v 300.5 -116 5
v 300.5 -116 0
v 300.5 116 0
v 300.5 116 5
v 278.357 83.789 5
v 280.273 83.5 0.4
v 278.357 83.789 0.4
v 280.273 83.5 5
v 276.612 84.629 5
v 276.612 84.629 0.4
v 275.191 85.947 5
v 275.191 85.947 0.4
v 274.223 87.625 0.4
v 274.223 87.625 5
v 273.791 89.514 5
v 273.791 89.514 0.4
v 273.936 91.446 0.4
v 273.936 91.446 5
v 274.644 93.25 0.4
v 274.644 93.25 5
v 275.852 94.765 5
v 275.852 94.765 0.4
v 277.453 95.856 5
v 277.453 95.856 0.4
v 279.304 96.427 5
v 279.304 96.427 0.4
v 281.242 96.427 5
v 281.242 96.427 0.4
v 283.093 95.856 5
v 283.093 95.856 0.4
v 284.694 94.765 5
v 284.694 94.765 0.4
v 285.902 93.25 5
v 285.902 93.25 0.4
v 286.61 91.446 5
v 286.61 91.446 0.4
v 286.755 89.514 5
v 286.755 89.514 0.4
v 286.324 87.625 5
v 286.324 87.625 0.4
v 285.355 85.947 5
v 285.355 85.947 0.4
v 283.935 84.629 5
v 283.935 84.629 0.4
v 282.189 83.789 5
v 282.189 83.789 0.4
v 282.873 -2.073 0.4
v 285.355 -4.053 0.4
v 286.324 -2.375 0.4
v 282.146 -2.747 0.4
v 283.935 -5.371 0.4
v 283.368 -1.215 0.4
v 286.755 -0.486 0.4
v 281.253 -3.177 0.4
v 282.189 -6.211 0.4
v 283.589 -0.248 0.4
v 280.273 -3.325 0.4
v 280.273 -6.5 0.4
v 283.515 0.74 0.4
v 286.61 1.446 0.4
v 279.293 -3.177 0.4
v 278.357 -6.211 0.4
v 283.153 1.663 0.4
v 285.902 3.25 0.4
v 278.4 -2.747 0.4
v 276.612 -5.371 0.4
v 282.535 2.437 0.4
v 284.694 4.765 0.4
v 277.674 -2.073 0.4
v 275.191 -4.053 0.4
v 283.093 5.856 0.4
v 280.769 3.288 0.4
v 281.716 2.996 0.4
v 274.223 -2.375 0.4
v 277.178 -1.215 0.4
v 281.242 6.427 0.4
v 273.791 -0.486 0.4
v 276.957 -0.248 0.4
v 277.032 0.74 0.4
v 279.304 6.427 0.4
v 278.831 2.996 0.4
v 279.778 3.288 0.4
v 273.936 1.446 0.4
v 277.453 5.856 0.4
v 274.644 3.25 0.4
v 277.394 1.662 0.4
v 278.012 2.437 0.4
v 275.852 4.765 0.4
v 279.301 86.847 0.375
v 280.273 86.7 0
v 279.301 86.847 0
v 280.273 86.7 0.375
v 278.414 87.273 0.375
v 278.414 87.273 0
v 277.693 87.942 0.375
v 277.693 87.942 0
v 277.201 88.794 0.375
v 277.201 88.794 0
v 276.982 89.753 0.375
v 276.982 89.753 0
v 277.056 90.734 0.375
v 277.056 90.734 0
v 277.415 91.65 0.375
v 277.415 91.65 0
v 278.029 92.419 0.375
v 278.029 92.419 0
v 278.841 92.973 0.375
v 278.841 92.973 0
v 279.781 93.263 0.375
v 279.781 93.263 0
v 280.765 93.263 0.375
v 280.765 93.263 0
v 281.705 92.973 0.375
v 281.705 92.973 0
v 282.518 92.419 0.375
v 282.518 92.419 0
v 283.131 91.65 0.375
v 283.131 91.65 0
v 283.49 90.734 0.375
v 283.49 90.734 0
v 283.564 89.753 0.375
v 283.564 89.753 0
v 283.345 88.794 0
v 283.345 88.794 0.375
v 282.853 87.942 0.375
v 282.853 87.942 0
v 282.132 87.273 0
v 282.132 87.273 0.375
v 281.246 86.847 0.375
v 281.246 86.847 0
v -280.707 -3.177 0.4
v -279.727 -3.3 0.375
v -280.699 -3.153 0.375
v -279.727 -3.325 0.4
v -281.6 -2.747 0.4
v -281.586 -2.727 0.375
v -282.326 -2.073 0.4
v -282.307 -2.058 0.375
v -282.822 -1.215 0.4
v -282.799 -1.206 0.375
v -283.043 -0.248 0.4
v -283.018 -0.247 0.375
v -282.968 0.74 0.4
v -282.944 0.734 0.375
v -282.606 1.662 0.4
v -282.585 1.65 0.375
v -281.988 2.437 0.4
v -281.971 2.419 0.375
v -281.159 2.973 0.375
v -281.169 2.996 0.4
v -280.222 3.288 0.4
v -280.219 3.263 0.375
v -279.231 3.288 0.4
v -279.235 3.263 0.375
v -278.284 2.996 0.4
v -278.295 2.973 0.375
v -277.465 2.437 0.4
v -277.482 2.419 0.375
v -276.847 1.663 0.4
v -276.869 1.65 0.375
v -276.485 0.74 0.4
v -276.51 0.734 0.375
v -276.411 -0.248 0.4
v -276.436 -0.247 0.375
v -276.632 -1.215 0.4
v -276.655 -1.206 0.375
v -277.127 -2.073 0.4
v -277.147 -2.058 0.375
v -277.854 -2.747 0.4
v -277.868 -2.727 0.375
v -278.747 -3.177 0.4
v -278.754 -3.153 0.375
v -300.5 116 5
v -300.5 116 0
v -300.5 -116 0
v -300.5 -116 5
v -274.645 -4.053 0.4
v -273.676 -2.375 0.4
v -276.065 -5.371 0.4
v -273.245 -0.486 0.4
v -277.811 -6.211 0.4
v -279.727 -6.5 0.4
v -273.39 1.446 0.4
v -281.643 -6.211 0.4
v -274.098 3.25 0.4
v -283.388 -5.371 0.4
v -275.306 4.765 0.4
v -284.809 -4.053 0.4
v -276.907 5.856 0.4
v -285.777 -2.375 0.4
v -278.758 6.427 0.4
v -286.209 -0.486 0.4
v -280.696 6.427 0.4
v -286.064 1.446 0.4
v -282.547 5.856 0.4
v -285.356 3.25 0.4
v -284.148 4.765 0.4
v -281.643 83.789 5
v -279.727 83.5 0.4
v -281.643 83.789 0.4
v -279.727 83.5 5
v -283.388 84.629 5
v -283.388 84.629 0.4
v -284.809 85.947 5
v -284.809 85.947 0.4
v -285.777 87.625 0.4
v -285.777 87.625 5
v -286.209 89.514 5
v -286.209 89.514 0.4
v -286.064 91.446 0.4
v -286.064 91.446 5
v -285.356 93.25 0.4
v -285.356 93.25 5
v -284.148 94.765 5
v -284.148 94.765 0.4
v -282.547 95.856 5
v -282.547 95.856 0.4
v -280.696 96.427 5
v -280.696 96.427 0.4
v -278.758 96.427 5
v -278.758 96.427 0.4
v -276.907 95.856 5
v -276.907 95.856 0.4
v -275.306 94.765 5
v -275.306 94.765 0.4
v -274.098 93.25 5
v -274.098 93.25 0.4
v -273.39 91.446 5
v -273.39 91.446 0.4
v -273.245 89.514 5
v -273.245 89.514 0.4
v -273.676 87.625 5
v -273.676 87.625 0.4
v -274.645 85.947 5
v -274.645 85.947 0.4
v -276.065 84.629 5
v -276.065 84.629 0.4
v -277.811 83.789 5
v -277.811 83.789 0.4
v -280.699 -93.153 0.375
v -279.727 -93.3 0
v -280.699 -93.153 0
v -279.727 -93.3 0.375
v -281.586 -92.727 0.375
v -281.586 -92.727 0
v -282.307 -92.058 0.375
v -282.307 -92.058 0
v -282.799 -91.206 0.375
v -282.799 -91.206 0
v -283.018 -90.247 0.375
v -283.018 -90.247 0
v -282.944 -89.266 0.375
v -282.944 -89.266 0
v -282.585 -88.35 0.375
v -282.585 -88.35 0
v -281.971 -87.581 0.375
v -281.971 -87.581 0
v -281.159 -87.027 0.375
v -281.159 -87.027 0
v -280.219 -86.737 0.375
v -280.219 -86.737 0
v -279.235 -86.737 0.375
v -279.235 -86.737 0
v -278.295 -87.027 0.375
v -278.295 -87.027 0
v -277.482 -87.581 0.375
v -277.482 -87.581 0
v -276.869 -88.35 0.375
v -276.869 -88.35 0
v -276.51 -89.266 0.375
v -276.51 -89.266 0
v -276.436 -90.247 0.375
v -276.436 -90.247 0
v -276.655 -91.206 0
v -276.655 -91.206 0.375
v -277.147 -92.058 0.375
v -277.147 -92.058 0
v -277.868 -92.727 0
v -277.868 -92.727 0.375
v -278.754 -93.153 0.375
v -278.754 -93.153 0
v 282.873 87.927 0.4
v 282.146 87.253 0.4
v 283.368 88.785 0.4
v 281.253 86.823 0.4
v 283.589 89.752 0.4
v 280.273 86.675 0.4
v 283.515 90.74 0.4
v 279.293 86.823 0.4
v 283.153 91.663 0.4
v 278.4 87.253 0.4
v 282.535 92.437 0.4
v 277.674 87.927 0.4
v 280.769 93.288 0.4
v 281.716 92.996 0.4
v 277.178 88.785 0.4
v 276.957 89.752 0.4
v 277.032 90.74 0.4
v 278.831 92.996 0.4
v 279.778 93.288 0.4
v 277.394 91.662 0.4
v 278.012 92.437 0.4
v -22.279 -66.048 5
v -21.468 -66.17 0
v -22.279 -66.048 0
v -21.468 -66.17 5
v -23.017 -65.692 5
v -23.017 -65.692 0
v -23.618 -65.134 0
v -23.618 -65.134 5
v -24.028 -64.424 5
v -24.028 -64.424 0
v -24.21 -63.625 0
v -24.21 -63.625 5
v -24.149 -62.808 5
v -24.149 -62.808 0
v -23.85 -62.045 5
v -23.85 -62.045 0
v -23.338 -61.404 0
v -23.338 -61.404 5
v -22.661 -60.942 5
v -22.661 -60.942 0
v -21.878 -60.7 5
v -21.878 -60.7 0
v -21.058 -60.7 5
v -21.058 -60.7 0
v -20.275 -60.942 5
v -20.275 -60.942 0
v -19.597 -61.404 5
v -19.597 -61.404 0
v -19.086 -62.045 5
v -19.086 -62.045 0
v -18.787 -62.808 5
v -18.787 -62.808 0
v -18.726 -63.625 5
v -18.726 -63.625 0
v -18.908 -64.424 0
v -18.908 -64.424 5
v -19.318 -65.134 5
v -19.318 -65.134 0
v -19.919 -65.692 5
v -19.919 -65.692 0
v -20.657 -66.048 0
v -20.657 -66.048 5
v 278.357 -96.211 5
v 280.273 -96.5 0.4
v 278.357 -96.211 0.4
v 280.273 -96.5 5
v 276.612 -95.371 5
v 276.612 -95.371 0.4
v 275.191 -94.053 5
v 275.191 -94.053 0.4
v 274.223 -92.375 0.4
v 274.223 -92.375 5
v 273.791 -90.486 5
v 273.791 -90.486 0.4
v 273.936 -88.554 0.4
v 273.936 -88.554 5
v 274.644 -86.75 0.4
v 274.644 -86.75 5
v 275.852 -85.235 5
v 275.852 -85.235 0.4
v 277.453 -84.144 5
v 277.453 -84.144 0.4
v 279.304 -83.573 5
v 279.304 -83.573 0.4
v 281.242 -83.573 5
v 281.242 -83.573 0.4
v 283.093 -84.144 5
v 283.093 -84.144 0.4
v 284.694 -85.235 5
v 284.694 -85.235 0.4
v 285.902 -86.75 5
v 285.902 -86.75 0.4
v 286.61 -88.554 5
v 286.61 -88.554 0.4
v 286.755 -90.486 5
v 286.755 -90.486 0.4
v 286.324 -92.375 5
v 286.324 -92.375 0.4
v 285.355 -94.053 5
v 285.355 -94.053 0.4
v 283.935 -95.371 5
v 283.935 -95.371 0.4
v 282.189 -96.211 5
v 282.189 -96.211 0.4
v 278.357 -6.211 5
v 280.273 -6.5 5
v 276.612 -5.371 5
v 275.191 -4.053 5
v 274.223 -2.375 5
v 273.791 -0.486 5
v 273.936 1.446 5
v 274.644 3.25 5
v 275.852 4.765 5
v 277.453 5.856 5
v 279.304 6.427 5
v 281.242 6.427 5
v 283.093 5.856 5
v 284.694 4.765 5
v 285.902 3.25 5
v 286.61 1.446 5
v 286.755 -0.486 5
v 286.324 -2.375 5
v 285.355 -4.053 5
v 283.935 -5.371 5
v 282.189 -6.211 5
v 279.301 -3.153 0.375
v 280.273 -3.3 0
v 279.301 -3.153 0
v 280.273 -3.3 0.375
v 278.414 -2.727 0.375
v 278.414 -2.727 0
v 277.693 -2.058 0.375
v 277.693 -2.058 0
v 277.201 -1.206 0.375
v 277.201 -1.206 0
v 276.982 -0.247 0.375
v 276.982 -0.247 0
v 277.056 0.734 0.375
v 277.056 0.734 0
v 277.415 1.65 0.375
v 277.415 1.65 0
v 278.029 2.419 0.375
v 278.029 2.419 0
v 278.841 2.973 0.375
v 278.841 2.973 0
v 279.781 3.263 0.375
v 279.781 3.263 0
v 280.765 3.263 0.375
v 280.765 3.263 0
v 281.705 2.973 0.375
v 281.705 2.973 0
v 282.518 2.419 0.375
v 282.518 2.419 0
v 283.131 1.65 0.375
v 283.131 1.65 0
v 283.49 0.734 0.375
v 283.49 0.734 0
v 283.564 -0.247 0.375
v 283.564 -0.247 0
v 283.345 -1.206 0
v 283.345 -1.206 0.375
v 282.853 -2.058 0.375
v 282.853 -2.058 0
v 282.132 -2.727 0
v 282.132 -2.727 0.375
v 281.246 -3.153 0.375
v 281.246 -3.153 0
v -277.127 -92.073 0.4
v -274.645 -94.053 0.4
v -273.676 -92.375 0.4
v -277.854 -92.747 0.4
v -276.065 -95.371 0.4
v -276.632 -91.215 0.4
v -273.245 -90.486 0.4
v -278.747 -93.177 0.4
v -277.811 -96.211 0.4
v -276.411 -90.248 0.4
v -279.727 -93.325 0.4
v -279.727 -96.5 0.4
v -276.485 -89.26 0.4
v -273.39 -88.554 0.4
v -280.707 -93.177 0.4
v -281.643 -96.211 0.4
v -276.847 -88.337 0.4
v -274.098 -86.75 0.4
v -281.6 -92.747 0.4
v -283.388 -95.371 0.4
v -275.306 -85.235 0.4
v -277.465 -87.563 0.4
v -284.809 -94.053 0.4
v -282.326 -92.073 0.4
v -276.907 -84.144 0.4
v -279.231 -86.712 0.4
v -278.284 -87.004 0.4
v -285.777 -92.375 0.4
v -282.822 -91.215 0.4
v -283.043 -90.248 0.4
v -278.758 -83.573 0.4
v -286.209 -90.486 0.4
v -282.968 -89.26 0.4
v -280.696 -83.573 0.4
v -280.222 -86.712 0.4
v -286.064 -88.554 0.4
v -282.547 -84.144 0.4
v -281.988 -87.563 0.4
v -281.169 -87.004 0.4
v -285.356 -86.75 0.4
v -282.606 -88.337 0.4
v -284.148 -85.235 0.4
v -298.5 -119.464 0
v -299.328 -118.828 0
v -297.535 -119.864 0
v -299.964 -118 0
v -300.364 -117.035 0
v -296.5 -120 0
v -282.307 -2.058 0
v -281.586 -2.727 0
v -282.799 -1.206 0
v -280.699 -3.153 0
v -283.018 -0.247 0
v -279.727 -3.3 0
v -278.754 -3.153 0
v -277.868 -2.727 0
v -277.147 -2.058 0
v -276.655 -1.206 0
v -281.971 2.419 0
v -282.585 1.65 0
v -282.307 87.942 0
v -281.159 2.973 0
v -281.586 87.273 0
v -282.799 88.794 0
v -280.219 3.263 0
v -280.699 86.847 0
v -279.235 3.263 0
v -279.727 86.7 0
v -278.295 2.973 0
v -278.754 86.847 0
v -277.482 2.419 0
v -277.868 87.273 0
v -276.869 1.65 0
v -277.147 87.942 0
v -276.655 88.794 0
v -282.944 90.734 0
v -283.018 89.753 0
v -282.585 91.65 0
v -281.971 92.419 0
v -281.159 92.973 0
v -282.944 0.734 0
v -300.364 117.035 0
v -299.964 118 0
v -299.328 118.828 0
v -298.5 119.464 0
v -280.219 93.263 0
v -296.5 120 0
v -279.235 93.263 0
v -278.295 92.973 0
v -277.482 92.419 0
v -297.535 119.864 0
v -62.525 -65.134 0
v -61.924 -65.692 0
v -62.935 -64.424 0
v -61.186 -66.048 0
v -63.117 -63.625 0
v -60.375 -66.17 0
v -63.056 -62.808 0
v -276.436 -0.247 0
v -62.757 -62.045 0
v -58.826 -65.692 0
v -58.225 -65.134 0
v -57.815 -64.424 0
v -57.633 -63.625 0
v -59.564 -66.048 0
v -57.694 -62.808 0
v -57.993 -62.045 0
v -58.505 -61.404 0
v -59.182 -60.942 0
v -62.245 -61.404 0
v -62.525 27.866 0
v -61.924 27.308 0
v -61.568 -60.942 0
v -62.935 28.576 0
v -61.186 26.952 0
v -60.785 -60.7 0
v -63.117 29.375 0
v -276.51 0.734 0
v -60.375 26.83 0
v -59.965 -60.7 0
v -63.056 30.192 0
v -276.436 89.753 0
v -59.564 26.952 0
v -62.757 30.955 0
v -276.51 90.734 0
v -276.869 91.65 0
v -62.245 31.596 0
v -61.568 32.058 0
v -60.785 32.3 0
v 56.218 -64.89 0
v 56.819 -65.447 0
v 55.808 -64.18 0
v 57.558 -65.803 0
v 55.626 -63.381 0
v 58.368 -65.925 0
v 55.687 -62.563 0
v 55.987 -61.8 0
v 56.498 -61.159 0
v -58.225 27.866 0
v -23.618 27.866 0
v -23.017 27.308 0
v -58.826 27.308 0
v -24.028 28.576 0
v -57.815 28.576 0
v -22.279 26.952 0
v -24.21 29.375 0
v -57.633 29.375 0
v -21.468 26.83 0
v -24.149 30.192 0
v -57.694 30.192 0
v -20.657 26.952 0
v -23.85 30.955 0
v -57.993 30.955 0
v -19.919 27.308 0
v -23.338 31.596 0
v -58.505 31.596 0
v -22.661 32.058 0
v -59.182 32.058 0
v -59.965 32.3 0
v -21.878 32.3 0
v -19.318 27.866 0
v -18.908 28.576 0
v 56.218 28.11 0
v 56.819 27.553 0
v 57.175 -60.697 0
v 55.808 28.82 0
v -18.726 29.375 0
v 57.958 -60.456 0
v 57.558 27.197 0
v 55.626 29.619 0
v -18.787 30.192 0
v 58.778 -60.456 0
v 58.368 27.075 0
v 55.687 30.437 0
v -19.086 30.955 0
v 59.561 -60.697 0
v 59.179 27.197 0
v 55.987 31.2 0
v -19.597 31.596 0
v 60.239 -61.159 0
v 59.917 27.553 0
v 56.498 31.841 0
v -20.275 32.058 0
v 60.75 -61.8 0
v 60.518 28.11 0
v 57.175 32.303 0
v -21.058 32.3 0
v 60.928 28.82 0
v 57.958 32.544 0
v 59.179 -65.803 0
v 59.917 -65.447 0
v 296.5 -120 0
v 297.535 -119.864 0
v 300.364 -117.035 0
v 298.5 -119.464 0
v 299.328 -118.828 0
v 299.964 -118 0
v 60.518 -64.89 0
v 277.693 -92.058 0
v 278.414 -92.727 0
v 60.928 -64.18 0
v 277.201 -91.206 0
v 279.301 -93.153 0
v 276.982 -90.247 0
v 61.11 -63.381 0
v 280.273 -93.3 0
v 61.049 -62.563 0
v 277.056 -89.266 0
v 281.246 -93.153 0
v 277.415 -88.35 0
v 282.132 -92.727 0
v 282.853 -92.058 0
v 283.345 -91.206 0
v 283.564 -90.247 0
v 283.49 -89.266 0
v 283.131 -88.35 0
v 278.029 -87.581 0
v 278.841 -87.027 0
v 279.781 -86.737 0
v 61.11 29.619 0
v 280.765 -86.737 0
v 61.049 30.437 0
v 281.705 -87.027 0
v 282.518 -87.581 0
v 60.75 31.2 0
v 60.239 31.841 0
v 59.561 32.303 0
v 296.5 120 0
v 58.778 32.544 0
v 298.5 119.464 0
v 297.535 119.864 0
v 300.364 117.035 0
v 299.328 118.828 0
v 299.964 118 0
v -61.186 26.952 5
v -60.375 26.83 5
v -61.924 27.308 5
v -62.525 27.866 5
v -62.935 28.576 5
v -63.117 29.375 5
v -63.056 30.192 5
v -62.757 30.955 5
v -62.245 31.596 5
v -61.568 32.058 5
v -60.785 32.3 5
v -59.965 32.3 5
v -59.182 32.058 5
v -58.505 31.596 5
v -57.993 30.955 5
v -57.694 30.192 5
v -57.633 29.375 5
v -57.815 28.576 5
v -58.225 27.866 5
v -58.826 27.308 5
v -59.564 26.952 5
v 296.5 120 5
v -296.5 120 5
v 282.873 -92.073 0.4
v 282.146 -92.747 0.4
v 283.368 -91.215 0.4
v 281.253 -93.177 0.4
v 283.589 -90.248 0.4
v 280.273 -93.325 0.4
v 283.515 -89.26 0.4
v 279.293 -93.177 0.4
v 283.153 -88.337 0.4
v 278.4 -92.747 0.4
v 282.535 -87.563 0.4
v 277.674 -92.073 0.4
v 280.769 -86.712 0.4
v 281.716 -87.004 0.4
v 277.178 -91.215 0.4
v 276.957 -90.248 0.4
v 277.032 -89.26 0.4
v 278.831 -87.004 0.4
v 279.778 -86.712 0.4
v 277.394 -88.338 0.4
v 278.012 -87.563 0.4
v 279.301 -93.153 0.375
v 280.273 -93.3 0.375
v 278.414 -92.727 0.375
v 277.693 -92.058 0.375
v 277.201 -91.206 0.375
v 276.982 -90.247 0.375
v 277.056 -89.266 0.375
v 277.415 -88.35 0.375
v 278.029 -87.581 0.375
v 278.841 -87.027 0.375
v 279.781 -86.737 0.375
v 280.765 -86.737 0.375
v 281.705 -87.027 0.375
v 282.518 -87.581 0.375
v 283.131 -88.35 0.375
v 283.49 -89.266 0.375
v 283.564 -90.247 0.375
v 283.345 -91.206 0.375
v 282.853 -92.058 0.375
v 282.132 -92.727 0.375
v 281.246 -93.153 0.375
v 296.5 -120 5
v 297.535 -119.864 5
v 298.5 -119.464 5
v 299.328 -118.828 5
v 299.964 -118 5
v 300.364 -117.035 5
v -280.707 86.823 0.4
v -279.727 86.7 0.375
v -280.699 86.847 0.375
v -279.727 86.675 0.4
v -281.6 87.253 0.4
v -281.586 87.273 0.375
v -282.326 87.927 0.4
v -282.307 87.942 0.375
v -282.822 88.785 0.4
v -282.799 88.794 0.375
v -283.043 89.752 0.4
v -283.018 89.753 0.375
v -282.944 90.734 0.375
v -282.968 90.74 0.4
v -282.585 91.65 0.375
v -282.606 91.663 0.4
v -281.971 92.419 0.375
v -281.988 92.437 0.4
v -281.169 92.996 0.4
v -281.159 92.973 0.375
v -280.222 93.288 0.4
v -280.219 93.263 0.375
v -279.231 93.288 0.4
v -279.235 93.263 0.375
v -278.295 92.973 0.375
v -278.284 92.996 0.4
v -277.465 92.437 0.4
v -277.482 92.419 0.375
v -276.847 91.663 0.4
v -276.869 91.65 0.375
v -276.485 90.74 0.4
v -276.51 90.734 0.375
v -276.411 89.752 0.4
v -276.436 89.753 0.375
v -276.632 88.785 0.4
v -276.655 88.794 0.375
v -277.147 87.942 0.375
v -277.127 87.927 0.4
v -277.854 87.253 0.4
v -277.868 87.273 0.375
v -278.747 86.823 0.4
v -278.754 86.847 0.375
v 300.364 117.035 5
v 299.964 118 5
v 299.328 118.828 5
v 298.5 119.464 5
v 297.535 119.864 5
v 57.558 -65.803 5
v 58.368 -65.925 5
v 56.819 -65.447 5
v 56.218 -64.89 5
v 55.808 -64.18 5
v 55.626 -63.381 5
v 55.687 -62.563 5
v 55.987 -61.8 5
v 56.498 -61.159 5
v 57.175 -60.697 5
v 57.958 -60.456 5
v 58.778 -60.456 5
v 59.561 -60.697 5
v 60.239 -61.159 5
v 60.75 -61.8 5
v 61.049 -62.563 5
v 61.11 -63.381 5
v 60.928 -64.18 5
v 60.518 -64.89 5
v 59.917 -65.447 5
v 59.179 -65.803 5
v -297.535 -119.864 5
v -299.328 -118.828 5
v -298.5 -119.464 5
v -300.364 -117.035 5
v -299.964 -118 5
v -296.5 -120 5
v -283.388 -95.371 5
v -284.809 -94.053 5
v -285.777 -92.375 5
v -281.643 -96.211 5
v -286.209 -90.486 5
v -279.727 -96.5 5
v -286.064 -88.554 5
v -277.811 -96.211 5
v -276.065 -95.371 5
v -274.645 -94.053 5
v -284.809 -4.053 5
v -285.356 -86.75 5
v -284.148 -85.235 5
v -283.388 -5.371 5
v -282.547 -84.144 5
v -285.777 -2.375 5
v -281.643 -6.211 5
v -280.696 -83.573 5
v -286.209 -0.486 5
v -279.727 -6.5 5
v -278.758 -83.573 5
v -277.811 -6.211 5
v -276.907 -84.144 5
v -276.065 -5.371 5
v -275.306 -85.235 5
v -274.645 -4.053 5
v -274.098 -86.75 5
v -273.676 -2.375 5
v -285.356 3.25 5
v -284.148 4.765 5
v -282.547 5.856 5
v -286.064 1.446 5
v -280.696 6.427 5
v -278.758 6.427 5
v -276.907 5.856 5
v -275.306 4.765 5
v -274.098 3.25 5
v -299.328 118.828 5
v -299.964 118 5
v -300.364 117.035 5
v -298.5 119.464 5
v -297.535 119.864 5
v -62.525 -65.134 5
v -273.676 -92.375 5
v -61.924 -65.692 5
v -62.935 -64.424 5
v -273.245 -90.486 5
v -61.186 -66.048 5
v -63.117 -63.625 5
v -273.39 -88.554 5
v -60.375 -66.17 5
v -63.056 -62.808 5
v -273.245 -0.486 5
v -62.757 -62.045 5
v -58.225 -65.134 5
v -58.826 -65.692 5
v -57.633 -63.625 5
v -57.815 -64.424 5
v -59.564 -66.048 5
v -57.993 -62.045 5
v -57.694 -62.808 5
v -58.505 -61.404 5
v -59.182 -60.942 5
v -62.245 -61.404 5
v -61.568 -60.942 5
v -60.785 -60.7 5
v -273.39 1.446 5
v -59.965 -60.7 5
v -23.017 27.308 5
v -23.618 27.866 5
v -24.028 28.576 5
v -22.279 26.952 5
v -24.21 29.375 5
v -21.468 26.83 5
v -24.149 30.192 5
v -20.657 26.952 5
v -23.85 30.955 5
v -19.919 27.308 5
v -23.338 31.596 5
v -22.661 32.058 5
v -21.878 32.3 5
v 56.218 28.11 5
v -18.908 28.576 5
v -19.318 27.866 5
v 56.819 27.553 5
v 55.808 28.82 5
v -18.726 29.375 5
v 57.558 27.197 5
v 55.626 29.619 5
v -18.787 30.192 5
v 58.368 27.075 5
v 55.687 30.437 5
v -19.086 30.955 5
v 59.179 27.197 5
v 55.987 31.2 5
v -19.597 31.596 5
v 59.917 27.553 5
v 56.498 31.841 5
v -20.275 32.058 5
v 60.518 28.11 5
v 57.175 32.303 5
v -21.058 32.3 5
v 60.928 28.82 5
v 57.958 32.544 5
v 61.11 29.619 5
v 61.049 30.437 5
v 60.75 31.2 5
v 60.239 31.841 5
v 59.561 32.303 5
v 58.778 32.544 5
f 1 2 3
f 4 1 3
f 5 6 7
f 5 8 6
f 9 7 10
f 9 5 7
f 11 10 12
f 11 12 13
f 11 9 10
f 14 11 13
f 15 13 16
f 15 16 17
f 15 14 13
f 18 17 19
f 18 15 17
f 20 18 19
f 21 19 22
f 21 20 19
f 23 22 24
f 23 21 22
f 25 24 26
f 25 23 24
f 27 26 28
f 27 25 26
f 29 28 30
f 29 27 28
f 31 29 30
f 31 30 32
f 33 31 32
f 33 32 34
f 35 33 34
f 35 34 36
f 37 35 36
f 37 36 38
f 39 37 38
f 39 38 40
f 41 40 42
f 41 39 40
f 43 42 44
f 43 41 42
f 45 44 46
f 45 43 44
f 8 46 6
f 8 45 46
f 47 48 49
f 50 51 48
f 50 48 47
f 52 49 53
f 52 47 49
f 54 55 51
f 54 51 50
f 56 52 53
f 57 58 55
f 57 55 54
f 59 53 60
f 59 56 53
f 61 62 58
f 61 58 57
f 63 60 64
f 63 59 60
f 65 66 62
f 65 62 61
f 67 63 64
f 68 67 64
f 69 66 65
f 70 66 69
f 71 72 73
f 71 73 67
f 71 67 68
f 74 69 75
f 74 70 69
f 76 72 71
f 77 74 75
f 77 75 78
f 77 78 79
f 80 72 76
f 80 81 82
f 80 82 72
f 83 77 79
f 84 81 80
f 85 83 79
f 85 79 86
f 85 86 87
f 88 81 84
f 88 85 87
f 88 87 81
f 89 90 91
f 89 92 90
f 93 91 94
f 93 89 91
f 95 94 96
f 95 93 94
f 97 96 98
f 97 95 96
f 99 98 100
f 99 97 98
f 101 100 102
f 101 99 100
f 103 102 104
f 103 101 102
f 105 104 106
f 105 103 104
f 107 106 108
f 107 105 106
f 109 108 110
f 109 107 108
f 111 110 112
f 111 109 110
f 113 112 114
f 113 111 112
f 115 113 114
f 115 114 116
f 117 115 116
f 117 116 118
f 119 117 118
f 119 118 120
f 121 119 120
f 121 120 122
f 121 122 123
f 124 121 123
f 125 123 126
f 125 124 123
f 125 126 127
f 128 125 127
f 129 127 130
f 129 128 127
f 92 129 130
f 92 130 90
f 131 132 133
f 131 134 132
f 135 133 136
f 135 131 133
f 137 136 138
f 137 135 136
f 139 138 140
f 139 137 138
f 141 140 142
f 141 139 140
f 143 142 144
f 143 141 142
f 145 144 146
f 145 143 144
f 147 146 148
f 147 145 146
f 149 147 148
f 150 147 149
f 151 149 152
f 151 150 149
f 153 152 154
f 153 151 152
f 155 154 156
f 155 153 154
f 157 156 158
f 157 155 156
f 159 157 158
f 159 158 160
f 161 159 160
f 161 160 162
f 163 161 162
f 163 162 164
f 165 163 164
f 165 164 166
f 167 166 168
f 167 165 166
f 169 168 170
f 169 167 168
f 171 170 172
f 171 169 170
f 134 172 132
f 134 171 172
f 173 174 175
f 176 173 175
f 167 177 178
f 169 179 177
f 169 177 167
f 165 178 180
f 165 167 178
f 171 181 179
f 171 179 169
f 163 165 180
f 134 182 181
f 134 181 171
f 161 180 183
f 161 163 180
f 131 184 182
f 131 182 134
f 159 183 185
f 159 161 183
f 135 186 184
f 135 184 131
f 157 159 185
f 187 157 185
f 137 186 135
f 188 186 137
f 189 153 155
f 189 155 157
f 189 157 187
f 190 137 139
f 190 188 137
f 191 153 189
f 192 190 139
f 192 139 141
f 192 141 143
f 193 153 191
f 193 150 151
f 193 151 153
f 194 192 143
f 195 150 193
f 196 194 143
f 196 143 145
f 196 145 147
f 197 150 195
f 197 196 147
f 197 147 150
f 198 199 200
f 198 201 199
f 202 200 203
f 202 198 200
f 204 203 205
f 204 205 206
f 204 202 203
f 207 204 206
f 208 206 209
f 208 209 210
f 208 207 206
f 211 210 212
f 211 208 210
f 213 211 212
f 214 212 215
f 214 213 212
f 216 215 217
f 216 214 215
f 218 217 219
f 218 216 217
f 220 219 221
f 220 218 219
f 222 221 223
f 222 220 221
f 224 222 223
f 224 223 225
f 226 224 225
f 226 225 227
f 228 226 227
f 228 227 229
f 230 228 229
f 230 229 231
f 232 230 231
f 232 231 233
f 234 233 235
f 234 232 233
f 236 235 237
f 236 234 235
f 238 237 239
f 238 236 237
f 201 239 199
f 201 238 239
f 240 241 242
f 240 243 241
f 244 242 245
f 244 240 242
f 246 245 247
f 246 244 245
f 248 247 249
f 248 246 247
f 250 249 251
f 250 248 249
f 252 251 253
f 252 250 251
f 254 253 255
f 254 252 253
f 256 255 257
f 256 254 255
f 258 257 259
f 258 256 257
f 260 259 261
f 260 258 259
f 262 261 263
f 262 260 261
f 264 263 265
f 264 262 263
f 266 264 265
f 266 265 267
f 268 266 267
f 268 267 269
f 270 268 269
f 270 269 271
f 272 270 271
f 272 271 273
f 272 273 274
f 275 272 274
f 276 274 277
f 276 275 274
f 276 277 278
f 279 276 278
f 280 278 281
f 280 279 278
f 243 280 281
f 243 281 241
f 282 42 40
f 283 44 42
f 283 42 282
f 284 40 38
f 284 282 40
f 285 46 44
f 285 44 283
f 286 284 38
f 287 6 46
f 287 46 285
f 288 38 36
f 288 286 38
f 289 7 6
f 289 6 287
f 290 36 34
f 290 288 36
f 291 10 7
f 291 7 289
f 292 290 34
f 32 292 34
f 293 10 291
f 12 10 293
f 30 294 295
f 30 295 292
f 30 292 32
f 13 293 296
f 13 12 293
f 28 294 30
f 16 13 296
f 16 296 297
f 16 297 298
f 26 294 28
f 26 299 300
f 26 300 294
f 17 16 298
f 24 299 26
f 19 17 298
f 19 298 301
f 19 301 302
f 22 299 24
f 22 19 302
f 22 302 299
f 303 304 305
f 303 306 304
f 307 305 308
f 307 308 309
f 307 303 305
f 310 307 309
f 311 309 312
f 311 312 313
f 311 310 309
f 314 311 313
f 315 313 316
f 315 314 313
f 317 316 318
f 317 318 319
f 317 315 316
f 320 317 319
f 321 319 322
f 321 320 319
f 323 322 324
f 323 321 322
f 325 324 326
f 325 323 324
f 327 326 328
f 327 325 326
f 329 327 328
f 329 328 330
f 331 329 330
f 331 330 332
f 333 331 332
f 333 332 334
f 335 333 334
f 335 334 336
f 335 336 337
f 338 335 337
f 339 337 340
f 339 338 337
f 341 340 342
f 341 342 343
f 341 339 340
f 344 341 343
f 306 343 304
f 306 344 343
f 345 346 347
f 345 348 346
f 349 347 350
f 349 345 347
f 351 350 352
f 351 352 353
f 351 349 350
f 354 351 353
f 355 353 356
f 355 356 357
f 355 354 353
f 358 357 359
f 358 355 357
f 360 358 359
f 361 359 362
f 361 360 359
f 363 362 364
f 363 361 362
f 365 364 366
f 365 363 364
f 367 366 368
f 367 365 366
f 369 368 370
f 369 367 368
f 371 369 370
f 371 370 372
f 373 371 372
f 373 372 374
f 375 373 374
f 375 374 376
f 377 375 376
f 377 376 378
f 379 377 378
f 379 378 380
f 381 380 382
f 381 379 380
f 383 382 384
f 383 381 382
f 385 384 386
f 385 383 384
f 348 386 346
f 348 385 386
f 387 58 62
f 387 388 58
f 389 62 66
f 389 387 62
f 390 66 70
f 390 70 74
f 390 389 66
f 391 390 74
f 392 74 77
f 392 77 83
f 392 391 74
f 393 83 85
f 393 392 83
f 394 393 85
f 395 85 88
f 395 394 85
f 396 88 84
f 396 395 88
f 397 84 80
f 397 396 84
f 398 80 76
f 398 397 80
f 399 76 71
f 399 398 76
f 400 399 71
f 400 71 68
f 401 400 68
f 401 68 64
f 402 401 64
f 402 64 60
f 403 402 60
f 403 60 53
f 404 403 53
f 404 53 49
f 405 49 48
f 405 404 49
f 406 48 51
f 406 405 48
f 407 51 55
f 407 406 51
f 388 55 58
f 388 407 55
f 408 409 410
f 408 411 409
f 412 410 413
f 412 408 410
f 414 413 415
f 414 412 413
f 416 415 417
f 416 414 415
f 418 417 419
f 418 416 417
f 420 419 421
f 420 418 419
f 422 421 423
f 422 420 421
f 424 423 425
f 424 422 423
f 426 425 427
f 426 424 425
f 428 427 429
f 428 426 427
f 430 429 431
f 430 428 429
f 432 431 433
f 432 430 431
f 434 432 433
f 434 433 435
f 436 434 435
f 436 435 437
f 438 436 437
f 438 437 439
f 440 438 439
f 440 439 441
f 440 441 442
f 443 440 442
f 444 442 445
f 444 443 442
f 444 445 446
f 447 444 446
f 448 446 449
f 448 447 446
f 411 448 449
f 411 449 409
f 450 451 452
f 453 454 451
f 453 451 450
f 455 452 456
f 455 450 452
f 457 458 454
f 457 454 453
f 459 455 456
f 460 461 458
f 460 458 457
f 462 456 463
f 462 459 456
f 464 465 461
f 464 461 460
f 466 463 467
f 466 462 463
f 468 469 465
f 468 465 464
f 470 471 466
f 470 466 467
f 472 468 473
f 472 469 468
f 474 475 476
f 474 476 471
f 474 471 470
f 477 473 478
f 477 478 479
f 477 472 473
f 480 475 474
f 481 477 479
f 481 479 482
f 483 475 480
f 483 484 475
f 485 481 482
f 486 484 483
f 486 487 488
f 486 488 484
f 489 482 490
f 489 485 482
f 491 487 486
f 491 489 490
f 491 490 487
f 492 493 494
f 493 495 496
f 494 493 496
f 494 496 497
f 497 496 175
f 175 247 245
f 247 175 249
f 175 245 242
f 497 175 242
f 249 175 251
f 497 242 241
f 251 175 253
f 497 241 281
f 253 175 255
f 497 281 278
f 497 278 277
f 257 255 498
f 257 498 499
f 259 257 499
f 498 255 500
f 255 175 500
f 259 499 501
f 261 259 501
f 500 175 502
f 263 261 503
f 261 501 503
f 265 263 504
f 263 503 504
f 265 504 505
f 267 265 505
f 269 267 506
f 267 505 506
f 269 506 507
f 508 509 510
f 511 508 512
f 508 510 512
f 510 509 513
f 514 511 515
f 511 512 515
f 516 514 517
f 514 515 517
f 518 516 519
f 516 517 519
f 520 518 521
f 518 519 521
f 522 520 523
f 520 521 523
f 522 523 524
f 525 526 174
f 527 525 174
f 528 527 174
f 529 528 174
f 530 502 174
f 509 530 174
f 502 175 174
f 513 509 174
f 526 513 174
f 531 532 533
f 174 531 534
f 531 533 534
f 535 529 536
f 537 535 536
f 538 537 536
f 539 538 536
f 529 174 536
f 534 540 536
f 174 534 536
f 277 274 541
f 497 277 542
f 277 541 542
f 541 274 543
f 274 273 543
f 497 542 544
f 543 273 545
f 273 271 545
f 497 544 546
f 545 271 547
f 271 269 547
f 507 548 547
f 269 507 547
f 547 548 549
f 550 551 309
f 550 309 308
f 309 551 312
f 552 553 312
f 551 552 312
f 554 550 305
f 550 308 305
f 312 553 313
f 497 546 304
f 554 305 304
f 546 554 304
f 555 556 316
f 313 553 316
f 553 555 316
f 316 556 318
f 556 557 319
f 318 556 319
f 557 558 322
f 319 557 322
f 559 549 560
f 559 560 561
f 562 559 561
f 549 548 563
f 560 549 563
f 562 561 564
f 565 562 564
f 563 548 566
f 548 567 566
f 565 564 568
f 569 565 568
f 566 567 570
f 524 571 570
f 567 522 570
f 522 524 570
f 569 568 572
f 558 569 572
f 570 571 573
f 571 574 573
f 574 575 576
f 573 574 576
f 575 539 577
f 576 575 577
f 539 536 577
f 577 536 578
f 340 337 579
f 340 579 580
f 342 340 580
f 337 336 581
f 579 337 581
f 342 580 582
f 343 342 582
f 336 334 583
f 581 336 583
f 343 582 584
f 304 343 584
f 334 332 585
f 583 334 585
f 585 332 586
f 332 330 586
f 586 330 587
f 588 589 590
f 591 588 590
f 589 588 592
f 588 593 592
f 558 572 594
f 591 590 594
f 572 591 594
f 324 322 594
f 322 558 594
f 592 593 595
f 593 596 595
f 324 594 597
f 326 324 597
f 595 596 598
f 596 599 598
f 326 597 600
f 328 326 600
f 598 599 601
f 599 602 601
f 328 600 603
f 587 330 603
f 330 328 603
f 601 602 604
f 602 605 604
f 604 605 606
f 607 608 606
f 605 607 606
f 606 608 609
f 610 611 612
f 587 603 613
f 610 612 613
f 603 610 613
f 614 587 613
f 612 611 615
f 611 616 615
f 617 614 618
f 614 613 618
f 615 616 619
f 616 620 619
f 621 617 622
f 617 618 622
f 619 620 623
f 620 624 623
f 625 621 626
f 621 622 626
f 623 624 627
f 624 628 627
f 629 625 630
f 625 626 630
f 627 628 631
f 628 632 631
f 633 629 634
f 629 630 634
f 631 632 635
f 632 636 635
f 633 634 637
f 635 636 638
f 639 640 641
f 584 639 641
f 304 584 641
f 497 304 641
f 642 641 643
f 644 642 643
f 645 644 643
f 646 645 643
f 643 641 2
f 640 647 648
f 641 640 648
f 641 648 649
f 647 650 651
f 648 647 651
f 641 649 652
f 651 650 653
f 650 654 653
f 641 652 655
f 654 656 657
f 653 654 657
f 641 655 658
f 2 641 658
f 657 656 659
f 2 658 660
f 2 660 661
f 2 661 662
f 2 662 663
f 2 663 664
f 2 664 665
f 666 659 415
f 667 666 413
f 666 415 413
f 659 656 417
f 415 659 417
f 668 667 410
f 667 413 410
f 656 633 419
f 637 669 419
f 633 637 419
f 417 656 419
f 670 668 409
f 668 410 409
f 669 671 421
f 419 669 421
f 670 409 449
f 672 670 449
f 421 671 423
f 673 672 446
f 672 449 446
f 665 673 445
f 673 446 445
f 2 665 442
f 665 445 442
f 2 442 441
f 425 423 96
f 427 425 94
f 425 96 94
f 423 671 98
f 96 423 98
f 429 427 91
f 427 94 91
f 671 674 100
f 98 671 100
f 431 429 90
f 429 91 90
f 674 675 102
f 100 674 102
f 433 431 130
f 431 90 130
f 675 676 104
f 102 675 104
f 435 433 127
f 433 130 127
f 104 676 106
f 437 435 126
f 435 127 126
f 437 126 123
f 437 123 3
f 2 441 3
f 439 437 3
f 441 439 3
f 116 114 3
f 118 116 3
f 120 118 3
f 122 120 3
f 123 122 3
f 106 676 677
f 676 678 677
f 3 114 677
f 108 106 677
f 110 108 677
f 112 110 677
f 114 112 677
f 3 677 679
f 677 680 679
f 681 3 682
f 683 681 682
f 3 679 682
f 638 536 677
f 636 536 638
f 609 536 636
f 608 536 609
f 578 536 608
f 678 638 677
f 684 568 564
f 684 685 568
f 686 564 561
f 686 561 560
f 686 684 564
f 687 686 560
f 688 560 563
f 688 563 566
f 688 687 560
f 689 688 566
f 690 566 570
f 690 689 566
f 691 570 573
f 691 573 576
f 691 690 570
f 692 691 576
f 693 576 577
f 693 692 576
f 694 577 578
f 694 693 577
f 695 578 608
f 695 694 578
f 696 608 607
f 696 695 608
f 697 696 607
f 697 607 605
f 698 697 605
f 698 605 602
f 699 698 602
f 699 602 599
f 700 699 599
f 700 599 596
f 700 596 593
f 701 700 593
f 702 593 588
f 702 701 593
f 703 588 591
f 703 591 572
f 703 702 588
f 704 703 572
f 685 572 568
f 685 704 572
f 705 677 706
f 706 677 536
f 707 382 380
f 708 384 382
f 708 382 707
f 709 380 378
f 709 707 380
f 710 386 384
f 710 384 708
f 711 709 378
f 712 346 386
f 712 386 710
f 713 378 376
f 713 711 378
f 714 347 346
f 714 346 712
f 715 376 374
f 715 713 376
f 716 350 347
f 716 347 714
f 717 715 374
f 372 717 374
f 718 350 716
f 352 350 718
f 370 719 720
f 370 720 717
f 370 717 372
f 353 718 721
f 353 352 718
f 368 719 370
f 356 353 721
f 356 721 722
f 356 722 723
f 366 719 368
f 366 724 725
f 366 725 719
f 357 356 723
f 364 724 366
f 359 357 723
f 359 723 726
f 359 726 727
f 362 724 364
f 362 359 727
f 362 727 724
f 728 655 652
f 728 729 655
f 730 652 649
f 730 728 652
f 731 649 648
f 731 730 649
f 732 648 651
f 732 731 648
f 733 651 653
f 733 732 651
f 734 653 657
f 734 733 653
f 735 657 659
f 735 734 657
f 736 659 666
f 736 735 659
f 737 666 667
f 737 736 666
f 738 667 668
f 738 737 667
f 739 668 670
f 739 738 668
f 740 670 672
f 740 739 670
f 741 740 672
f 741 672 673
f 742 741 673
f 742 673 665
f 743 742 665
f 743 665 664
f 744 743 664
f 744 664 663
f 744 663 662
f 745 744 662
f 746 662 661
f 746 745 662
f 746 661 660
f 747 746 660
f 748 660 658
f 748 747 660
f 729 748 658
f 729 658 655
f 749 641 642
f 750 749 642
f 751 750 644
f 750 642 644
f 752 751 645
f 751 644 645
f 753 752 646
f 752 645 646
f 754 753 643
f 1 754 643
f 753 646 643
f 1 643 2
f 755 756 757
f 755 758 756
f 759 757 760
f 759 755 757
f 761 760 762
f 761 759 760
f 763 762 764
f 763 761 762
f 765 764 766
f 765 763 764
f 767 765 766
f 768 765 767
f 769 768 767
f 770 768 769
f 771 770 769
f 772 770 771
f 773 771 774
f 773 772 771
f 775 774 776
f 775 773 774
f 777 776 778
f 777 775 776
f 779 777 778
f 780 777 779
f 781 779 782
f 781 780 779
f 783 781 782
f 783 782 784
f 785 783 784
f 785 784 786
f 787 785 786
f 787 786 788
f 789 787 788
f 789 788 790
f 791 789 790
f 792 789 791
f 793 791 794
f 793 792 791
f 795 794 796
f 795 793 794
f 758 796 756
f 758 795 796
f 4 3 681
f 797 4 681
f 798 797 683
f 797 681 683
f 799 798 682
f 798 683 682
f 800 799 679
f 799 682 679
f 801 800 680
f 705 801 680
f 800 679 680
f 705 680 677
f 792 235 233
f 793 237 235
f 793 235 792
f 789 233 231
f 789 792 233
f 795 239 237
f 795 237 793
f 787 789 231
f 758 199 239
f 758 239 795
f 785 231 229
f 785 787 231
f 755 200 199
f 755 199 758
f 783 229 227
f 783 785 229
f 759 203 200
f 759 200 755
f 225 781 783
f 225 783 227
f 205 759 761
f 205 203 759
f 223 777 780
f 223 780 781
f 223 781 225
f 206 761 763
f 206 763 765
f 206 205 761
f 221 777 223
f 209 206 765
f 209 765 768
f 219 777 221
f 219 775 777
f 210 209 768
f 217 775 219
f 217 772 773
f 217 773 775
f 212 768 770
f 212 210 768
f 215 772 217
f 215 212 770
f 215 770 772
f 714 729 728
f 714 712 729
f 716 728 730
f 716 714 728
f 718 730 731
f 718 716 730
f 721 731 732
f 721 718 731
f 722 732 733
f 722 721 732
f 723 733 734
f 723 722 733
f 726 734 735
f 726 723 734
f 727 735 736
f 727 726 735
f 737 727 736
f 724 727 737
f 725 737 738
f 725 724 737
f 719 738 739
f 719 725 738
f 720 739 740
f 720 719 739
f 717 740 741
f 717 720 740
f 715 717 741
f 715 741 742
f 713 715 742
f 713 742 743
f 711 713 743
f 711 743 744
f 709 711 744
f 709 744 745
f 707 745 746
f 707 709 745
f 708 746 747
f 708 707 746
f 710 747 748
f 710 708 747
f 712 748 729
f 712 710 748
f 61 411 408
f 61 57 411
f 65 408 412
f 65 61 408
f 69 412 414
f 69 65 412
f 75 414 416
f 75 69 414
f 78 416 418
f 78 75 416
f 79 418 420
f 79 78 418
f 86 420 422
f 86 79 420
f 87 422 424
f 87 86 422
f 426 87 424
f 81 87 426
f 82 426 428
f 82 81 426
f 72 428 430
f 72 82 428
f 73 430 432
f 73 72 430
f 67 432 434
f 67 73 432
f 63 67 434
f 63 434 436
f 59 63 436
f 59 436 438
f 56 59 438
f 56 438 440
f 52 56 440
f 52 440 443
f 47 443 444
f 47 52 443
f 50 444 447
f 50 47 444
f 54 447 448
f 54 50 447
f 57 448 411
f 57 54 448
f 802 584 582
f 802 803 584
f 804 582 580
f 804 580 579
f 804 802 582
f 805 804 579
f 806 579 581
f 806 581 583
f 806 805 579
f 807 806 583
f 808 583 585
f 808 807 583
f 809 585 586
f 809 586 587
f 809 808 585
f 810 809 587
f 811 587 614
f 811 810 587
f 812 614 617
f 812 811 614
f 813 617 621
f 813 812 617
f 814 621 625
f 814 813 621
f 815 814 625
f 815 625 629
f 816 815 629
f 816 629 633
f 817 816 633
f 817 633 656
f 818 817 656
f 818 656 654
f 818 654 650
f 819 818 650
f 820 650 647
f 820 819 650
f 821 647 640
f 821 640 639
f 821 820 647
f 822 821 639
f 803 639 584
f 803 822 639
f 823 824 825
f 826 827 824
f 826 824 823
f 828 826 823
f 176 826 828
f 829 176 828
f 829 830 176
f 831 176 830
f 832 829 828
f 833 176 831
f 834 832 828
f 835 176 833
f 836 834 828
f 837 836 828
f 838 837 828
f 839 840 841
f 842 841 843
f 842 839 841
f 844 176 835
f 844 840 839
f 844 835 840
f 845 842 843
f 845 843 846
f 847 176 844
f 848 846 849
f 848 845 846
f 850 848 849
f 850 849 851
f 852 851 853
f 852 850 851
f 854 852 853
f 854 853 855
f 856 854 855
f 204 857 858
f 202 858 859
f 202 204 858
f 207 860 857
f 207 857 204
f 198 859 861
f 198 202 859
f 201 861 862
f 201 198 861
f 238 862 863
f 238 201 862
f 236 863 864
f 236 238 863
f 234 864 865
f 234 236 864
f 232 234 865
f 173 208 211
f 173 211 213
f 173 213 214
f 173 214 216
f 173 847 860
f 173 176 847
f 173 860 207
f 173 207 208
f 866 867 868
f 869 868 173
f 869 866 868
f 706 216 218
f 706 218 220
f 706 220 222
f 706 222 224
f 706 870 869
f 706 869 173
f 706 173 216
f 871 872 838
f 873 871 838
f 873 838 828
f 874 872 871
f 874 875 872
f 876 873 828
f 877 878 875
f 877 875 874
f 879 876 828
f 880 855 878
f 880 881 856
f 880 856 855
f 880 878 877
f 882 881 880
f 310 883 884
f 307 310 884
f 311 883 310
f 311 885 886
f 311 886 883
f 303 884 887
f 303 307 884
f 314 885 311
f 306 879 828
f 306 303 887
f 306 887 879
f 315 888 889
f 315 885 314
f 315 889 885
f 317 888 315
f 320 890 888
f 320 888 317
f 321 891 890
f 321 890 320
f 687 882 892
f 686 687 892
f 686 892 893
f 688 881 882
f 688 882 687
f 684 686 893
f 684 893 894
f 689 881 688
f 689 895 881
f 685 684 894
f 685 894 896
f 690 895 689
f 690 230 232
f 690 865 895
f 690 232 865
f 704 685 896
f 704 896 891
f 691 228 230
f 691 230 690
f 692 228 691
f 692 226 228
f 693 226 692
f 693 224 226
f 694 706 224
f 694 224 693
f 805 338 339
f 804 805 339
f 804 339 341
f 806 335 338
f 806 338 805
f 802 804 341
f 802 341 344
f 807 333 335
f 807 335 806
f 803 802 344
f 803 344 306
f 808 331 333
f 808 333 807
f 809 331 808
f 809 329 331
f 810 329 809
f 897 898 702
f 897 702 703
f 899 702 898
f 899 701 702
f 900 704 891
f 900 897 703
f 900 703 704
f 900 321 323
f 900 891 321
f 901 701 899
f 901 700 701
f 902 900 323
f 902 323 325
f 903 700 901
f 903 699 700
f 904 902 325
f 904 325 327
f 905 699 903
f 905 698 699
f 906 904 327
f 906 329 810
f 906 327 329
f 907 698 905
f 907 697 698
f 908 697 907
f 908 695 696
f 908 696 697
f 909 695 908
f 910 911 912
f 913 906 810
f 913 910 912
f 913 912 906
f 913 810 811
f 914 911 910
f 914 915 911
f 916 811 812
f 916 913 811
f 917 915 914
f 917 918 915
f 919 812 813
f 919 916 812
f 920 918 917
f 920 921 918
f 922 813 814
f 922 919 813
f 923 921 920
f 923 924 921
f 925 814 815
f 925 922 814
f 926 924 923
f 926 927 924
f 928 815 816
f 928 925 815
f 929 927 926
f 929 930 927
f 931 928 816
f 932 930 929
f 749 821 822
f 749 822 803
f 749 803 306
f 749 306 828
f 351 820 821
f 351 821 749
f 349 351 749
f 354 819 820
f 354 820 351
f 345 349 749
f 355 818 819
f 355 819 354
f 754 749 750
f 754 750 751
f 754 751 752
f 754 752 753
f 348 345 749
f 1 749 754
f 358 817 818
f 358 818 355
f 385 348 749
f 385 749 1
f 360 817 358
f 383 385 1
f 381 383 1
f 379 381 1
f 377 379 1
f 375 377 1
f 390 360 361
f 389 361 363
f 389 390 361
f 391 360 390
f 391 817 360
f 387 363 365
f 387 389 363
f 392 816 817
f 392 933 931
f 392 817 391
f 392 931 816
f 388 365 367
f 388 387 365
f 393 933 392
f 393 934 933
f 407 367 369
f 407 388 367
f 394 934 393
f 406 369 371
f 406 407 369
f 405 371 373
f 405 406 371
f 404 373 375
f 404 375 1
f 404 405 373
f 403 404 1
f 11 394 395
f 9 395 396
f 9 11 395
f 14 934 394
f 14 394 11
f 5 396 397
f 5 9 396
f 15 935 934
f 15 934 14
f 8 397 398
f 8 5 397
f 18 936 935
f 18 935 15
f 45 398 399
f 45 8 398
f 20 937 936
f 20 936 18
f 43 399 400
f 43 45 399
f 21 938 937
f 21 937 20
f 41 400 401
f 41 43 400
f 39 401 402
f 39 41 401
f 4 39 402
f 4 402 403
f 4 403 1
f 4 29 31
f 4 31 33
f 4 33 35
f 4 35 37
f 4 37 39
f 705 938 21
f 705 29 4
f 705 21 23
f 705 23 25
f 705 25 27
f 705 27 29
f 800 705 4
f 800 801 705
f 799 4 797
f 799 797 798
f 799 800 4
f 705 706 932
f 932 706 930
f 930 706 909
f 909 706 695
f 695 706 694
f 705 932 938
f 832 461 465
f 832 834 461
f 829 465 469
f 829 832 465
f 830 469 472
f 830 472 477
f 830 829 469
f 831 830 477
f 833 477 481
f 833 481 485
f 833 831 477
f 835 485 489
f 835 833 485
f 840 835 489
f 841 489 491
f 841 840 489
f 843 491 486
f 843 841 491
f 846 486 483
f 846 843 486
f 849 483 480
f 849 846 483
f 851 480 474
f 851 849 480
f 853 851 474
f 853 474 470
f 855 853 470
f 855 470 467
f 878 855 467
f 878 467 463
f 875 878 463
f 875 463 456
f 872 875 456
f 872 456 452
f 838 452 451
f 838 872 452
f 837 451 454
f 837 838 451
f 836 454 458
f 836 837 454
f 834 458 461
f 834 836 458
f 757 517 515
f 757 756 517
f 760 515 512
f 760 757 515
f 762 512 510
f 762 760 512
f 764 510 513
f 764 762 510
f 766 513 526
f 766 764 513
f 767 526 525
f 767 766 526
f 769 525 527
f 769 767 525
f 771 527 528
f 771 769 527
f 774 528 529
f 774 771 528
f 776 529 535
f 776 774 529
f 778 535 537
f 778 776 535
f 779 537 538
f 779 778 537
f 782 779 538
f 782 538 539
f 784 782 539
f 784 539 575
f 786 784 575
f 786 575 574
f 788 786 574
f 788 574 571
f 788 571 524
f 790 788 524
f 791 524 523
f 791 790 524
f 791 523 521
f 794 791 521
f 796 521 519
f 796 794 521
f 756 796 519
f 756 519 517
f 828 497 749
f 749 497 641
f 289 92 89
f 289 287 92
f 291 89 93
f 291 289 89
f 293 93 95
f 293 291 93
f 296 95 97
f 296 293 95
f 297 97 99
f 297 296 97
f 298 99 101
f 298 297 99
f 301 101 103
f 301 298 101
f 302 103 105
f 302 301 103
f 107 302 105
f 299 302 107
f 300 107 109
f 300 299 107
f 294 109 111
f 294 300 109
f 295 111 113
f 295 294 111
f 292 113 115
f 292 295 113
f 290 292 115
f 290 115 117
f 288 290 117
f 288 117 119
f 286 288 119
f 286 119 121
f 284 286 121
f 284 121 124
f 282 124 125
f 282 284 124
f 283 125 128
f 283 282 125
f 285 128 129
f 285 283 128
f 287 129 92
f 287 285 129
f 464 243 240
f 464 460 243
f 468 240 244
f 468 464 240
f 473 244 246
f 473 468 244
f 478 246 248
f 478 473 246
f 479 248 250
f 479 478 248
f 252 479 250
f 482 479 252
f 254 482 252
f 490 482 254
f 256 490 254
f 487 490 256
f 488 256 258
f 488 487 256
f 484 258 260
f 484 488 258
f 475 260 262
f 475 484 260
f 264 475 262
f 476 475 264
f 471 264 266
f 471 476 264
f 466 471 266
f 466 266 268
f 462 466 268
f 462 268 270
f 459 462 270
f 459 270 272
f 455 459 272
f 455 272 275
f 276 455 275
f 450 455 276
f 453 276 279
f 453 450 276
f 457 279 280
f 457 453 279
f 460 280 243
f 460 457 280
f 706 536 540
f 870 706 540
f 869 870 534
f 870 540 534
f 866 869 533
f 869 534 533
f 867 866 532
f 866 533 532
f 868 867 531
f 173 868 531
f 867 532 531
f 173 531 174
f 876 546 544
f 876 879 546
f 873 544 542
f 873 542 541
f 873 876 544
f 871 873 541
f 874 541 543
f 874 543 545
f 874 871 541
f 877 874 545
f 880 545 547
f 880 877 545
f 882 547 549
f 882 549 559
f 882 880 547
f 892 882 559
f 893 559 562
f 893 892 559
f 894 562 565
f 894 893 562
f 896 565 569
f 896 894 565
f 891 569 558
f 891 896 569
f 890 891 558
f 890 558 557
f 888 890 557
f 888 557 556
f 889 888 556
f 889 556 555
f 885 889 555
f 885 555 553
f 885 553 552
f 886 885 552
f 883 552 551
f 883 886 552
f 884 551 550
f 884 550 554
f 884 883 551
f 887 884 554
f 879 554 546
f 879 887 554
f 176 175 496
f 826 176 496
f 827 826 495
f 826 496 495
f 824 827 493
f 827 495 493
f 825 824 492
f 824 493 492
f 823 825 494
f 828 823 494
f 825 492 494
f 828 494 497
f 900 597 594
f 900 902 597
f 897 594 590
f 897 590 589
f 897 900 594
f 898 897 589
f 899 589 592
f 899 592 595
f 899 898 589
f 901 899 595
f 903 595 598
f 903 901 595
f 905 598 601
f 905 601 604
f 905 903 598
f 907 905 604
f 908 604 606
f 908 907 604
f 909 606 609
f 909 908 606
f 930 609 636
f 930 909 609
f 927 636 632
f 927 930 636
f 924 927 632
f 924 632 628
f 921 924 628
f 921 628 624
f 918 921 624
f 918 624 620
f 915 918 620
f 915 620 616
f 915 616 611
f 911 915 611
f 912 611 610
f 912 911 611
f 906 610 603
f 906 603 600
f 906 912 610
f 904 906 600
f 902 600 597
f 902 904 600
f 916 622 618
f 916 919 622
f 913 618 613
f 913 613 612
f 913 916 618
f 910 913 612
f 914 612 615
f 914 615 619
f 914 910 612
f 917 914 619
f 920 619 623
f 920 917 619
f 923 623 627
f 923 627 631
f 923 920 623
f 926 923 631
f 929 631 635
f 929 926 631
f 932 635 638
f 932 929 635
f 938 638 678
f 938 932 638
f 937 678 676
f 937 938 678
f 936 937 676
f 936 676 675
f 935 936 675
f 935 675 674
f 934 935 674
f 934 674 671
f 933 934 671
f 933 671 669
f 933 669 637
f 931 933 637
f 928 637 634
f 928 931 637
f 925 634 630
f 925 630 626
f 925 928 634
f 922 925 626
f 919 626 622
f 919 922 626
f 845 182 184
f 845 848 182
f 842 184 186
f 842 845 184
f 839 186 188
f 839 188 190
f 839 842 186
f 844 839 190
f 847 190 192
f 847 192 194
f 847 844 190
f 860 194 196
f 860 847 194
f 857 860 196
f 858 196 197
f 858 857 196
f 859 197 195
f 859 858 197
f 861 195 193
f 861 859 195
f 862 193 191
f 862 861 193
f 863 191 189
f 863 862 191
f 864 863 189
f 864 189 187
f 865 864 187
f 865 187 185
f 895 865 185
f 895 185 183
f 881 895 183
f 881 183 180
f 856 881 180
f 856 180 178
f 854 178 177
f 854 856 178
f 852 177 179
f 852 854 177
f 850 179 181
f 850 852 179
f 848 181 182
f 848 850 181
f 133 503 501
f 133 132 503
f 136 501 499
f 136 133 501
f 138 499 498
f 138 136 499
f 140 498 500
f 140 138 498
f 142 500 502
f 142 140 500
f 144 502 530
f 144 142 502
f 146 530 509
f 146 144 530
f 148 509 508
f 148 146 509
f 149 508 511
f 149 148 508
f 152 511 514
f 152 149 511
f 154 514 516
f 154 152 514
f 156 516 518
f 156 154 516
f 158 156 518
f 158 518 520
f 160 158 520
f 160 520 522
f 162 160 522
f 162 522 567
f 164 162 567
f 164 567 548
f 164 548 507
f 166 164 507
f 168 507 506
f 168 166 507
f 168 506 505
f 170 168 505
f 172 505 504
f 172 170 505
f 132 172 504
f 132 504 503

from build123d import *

# Parameters (mm, degrees)
BOSS_EXTRUDE1_DEPTH                           = 5
CBORE_FOR_M6_PAN_HEAD_MACHINE_SCREW1_AT_COUNT = 2
CBORE_FOR_M6_PAN_HEAD_MACHINE_SCREW1_AT_PITCH = 90
CBORE_FOR_M6_PAN_HEAD_MACHINE_SCREW1_2_COUNT  = 2
CBORE_FOR_M6_PAN_HEAD_MACHINE_SCREW1_2_PITCH  = 90
LPATTERN1_COUNT                               = 2
LPATTERN1_PITCH                               = 560
M5_CLEARANCE_HOLE1_AT_2_COUNT                 = 2
M5_CLEARANCE_HOLE1_AT_2_PITCH                 = 38.907056767
M5_CLEARANCE_HOLE1_AT_3_COUNT                 = 2
M5_CLEARANCE_HOLE1_AT_3_PITCH                 = 118.743434782
LPATTERN2_COUNT                               = 2
LPATTERN2_PITCH                               = 93


with BuildPart() as part:
    # Sketch1 → Boss-Extrude1 (new body)
    with BuildSketch(Plane.XY):
        with BuildLine():
            Line((-296.5, -120), (296.5, -120))
            ThreePointArc((296.5, -120), (299.328427125, -118.828427125), (300.5, -116))
            Line((300.5, -116), (300.5, 116))
            ThreePointArc((300.5, 116), (299.328427125, 118.828427125), (296.5, 120))
            Line((296.5, 120), (-296.5, 120))
            ThreePointArc((-296.5, 120), (-299.328427125, 118.828427125), (-300.5, 116))
            Line((-300.5, 116), (-300.5, -116))
            ThreePointArc((-300.5, -116), (-299.328427125, -118.828427125), (-296.5, -120))
        make_face()
    extrude(amount=BOSS_EXTRUDE1_DEPTH)

    # Sketch2 → CBORE for M6 Pan Head Machine Screw1 (revolve, cut)
    with BuildSketch(Plane(origin=(280.273194374, 0, 5), x_dir=(0, -1, 0), z_dir=(1, 0, 0))):
        Polygon((0, 0), (0, 6.982840043), (3.3, 5), (3.3, 4.625), (3.325, 4.6), (6.5, 4.6), (6.5, 0), align=None)
    cbore_for_m6_pan_head_machine_screw1 = revolve(axis=Axis((280.273194374, 0, 11.35), (0, 0, -1)), mode=Mode.SUBTRACT)

    # CBORE for M6 Pan Head Machine Screw1 at: CBORE for M6 Pan Head Machine Screw1 ×2
    with Locations(*[(0, i * CBORE_FOR_M6_PAN_HEAD_MACHINE_SCREW1_AT_PITCH, 0) for i in range(1, CBORE_FOR_M6_PAN_HEAD_MACHINE_SCREW1_AT_COUNT)]):
        add(cbore_for_m6_pan_head_machine_screw1, mode=Mode.SUBTRACT)

    # CBORE for M6 Pan Head Machine Screw1 2: CBORE for M6 Pan Head Machine Screw1 ×2
    with Locations(*[(0, -i * CBORE_FOR_M6_PAN_HEAD_MACHINE_SCREW1_2_PITCH, 0) for i in range(1, CBORE_FOR_M6_PAN_HEAD_MACHINE_SCREW1_2_COUNT)]):
        add(cbore_for_m6_pan_head_machine_screw1, mode=Mode.SUBTRACT)

    # LPattern1: CBORE for M6 Pan Head Machine Screw1 ×2
    with Locations(*[(-i * LPATTERN1_PITCH, 0, 0) for i in range(1, LPATTERN1_COUNT)]):
        add(cbore_for_m6_pan_head_machine_screw1, mode=Mode.SUBTRACT)

    # LPattern1 copy 1 sketch → LPattern1 copy 1 (revolve, cut)
    with BuildSketch(Plane(origin=(-279.726805626, 90, 5), x_dir=(0, -1, 0), z_dir=(1, 0, 0))):
        Polygon((0, 0), (0, 6.982840043), (3.3, 5), (3.3, 4.625), (3.325, 4.6), (6.5, 4.6), (6.5, 0), align=None)
    revolve(axis=Axis((-279.726805626, 90, 11.35), (0, 0, -1)), mode=Mode.SUBTRACT)

    # LPattern1 copy 2 sketch → LPattern1 copy 2 (revolve, cut)
    with BuildSketch(Plane(origin=(-279.726805626, -90, 5), x_dir=(0, -1, 0), z_dir=(1, 0, 0))):
        Polygon((0, 0), (0, 6.982840043), (3.3, 5), (3.3, 4.625), (3.325, 4.6), (6.5, 4.6), (6.5, 0), align=None)
    revolve(axis=Axis((-279.726805626, -90, 11.35), (0, 0, -1)), mode=Mode.SUBTRACT)

    # Sketch4 → M5 Clearance Hole1 (revolve, cut)
    with BuildSketch(Plane(origin=(-60.375010772, -63.419690337, 5), x_dir=(0, -1, 0), z_dir=(1, 0, 0))):
        Polygon((0, 0), (0, 6.652366702), (2.75, 5), (2.75, 0), align=None)
    m5_clearance_hole1 = revolve(axis=Axis((-60.375010772, -63.419690337, 11.35), (0, 0, -1)), mode=Mode.SUBTRACT)

    # M5 Clearance Hole1 at 2: M5 Clearance Hole1 ×2
    with Locations(*[(i * M5_CLEARANCE_HOLE1_AT_2_PITCH, 0, 0) for i in range(1, M5_CLEARANCE_HOLE1_AT_2_COUNT)]):
        add(m5_clearance_hole1, mode=Mode.SUBTRACT)

    # M5 Clearance Hole1 at 3: M5 Clearance Hole1 ×2
    with Locations(*[Vector(0.9999978769286347, 0.002060615981510638, 0) * (i * M5_CLEARANCE_HOLE1_AT_3_PITCH) for i in range(1, M5_CLEARANCE_HOLE1_AT_3_COUNT)]):
        add(m5_clearance_hole1, mode=Mode.SUBTRACT)

    # LPattern2: M5 Clearance Hole1 ×2
    with Locations(*[(0, i * LPATTERN2_PITCH, 0) for i in range(1, LPATTERN2_COUNT)]):
        add(m5_clearance_hole1, mode=Mode.SUBTRACT)

    # LPattern2 copy 1 sketch → LPattern2 copy 1 (revolve, cut)
    with BuildSketch(Plane(origin=(-21.467954006, 29.580309663, 5), x_dir=(0, -1, 0), z_dir=(1, 0, 0))):
        Polygon((0, 0), (0, 6.652366702), (2.75, 5), (2.75, 0), align=None)
    revolve(axis=Axis((-21.467954006, 29.580309663, 11.35), (0, 0, -1)), mode=Mode.SUBTRACT)

    # LPattern2 copy 2 sketch → LPattern2 copy 2 (revolve, cut)
    with BuildSketch(Plane(origin=(58.368171909, 29.824994283, 5), x_dir=(0, -1, 0), z_dir=(1, 0, 0))):
        Polygon((0, 0), (0, 6.652366702), (2.75, 5), (2.75, 0), align=None)
    revolve(axis=Axis((58.368171909, 29.824994283, 11.35), (0, 0, -1)), mode=Mode.SUBTRACT)


solid = part.part
